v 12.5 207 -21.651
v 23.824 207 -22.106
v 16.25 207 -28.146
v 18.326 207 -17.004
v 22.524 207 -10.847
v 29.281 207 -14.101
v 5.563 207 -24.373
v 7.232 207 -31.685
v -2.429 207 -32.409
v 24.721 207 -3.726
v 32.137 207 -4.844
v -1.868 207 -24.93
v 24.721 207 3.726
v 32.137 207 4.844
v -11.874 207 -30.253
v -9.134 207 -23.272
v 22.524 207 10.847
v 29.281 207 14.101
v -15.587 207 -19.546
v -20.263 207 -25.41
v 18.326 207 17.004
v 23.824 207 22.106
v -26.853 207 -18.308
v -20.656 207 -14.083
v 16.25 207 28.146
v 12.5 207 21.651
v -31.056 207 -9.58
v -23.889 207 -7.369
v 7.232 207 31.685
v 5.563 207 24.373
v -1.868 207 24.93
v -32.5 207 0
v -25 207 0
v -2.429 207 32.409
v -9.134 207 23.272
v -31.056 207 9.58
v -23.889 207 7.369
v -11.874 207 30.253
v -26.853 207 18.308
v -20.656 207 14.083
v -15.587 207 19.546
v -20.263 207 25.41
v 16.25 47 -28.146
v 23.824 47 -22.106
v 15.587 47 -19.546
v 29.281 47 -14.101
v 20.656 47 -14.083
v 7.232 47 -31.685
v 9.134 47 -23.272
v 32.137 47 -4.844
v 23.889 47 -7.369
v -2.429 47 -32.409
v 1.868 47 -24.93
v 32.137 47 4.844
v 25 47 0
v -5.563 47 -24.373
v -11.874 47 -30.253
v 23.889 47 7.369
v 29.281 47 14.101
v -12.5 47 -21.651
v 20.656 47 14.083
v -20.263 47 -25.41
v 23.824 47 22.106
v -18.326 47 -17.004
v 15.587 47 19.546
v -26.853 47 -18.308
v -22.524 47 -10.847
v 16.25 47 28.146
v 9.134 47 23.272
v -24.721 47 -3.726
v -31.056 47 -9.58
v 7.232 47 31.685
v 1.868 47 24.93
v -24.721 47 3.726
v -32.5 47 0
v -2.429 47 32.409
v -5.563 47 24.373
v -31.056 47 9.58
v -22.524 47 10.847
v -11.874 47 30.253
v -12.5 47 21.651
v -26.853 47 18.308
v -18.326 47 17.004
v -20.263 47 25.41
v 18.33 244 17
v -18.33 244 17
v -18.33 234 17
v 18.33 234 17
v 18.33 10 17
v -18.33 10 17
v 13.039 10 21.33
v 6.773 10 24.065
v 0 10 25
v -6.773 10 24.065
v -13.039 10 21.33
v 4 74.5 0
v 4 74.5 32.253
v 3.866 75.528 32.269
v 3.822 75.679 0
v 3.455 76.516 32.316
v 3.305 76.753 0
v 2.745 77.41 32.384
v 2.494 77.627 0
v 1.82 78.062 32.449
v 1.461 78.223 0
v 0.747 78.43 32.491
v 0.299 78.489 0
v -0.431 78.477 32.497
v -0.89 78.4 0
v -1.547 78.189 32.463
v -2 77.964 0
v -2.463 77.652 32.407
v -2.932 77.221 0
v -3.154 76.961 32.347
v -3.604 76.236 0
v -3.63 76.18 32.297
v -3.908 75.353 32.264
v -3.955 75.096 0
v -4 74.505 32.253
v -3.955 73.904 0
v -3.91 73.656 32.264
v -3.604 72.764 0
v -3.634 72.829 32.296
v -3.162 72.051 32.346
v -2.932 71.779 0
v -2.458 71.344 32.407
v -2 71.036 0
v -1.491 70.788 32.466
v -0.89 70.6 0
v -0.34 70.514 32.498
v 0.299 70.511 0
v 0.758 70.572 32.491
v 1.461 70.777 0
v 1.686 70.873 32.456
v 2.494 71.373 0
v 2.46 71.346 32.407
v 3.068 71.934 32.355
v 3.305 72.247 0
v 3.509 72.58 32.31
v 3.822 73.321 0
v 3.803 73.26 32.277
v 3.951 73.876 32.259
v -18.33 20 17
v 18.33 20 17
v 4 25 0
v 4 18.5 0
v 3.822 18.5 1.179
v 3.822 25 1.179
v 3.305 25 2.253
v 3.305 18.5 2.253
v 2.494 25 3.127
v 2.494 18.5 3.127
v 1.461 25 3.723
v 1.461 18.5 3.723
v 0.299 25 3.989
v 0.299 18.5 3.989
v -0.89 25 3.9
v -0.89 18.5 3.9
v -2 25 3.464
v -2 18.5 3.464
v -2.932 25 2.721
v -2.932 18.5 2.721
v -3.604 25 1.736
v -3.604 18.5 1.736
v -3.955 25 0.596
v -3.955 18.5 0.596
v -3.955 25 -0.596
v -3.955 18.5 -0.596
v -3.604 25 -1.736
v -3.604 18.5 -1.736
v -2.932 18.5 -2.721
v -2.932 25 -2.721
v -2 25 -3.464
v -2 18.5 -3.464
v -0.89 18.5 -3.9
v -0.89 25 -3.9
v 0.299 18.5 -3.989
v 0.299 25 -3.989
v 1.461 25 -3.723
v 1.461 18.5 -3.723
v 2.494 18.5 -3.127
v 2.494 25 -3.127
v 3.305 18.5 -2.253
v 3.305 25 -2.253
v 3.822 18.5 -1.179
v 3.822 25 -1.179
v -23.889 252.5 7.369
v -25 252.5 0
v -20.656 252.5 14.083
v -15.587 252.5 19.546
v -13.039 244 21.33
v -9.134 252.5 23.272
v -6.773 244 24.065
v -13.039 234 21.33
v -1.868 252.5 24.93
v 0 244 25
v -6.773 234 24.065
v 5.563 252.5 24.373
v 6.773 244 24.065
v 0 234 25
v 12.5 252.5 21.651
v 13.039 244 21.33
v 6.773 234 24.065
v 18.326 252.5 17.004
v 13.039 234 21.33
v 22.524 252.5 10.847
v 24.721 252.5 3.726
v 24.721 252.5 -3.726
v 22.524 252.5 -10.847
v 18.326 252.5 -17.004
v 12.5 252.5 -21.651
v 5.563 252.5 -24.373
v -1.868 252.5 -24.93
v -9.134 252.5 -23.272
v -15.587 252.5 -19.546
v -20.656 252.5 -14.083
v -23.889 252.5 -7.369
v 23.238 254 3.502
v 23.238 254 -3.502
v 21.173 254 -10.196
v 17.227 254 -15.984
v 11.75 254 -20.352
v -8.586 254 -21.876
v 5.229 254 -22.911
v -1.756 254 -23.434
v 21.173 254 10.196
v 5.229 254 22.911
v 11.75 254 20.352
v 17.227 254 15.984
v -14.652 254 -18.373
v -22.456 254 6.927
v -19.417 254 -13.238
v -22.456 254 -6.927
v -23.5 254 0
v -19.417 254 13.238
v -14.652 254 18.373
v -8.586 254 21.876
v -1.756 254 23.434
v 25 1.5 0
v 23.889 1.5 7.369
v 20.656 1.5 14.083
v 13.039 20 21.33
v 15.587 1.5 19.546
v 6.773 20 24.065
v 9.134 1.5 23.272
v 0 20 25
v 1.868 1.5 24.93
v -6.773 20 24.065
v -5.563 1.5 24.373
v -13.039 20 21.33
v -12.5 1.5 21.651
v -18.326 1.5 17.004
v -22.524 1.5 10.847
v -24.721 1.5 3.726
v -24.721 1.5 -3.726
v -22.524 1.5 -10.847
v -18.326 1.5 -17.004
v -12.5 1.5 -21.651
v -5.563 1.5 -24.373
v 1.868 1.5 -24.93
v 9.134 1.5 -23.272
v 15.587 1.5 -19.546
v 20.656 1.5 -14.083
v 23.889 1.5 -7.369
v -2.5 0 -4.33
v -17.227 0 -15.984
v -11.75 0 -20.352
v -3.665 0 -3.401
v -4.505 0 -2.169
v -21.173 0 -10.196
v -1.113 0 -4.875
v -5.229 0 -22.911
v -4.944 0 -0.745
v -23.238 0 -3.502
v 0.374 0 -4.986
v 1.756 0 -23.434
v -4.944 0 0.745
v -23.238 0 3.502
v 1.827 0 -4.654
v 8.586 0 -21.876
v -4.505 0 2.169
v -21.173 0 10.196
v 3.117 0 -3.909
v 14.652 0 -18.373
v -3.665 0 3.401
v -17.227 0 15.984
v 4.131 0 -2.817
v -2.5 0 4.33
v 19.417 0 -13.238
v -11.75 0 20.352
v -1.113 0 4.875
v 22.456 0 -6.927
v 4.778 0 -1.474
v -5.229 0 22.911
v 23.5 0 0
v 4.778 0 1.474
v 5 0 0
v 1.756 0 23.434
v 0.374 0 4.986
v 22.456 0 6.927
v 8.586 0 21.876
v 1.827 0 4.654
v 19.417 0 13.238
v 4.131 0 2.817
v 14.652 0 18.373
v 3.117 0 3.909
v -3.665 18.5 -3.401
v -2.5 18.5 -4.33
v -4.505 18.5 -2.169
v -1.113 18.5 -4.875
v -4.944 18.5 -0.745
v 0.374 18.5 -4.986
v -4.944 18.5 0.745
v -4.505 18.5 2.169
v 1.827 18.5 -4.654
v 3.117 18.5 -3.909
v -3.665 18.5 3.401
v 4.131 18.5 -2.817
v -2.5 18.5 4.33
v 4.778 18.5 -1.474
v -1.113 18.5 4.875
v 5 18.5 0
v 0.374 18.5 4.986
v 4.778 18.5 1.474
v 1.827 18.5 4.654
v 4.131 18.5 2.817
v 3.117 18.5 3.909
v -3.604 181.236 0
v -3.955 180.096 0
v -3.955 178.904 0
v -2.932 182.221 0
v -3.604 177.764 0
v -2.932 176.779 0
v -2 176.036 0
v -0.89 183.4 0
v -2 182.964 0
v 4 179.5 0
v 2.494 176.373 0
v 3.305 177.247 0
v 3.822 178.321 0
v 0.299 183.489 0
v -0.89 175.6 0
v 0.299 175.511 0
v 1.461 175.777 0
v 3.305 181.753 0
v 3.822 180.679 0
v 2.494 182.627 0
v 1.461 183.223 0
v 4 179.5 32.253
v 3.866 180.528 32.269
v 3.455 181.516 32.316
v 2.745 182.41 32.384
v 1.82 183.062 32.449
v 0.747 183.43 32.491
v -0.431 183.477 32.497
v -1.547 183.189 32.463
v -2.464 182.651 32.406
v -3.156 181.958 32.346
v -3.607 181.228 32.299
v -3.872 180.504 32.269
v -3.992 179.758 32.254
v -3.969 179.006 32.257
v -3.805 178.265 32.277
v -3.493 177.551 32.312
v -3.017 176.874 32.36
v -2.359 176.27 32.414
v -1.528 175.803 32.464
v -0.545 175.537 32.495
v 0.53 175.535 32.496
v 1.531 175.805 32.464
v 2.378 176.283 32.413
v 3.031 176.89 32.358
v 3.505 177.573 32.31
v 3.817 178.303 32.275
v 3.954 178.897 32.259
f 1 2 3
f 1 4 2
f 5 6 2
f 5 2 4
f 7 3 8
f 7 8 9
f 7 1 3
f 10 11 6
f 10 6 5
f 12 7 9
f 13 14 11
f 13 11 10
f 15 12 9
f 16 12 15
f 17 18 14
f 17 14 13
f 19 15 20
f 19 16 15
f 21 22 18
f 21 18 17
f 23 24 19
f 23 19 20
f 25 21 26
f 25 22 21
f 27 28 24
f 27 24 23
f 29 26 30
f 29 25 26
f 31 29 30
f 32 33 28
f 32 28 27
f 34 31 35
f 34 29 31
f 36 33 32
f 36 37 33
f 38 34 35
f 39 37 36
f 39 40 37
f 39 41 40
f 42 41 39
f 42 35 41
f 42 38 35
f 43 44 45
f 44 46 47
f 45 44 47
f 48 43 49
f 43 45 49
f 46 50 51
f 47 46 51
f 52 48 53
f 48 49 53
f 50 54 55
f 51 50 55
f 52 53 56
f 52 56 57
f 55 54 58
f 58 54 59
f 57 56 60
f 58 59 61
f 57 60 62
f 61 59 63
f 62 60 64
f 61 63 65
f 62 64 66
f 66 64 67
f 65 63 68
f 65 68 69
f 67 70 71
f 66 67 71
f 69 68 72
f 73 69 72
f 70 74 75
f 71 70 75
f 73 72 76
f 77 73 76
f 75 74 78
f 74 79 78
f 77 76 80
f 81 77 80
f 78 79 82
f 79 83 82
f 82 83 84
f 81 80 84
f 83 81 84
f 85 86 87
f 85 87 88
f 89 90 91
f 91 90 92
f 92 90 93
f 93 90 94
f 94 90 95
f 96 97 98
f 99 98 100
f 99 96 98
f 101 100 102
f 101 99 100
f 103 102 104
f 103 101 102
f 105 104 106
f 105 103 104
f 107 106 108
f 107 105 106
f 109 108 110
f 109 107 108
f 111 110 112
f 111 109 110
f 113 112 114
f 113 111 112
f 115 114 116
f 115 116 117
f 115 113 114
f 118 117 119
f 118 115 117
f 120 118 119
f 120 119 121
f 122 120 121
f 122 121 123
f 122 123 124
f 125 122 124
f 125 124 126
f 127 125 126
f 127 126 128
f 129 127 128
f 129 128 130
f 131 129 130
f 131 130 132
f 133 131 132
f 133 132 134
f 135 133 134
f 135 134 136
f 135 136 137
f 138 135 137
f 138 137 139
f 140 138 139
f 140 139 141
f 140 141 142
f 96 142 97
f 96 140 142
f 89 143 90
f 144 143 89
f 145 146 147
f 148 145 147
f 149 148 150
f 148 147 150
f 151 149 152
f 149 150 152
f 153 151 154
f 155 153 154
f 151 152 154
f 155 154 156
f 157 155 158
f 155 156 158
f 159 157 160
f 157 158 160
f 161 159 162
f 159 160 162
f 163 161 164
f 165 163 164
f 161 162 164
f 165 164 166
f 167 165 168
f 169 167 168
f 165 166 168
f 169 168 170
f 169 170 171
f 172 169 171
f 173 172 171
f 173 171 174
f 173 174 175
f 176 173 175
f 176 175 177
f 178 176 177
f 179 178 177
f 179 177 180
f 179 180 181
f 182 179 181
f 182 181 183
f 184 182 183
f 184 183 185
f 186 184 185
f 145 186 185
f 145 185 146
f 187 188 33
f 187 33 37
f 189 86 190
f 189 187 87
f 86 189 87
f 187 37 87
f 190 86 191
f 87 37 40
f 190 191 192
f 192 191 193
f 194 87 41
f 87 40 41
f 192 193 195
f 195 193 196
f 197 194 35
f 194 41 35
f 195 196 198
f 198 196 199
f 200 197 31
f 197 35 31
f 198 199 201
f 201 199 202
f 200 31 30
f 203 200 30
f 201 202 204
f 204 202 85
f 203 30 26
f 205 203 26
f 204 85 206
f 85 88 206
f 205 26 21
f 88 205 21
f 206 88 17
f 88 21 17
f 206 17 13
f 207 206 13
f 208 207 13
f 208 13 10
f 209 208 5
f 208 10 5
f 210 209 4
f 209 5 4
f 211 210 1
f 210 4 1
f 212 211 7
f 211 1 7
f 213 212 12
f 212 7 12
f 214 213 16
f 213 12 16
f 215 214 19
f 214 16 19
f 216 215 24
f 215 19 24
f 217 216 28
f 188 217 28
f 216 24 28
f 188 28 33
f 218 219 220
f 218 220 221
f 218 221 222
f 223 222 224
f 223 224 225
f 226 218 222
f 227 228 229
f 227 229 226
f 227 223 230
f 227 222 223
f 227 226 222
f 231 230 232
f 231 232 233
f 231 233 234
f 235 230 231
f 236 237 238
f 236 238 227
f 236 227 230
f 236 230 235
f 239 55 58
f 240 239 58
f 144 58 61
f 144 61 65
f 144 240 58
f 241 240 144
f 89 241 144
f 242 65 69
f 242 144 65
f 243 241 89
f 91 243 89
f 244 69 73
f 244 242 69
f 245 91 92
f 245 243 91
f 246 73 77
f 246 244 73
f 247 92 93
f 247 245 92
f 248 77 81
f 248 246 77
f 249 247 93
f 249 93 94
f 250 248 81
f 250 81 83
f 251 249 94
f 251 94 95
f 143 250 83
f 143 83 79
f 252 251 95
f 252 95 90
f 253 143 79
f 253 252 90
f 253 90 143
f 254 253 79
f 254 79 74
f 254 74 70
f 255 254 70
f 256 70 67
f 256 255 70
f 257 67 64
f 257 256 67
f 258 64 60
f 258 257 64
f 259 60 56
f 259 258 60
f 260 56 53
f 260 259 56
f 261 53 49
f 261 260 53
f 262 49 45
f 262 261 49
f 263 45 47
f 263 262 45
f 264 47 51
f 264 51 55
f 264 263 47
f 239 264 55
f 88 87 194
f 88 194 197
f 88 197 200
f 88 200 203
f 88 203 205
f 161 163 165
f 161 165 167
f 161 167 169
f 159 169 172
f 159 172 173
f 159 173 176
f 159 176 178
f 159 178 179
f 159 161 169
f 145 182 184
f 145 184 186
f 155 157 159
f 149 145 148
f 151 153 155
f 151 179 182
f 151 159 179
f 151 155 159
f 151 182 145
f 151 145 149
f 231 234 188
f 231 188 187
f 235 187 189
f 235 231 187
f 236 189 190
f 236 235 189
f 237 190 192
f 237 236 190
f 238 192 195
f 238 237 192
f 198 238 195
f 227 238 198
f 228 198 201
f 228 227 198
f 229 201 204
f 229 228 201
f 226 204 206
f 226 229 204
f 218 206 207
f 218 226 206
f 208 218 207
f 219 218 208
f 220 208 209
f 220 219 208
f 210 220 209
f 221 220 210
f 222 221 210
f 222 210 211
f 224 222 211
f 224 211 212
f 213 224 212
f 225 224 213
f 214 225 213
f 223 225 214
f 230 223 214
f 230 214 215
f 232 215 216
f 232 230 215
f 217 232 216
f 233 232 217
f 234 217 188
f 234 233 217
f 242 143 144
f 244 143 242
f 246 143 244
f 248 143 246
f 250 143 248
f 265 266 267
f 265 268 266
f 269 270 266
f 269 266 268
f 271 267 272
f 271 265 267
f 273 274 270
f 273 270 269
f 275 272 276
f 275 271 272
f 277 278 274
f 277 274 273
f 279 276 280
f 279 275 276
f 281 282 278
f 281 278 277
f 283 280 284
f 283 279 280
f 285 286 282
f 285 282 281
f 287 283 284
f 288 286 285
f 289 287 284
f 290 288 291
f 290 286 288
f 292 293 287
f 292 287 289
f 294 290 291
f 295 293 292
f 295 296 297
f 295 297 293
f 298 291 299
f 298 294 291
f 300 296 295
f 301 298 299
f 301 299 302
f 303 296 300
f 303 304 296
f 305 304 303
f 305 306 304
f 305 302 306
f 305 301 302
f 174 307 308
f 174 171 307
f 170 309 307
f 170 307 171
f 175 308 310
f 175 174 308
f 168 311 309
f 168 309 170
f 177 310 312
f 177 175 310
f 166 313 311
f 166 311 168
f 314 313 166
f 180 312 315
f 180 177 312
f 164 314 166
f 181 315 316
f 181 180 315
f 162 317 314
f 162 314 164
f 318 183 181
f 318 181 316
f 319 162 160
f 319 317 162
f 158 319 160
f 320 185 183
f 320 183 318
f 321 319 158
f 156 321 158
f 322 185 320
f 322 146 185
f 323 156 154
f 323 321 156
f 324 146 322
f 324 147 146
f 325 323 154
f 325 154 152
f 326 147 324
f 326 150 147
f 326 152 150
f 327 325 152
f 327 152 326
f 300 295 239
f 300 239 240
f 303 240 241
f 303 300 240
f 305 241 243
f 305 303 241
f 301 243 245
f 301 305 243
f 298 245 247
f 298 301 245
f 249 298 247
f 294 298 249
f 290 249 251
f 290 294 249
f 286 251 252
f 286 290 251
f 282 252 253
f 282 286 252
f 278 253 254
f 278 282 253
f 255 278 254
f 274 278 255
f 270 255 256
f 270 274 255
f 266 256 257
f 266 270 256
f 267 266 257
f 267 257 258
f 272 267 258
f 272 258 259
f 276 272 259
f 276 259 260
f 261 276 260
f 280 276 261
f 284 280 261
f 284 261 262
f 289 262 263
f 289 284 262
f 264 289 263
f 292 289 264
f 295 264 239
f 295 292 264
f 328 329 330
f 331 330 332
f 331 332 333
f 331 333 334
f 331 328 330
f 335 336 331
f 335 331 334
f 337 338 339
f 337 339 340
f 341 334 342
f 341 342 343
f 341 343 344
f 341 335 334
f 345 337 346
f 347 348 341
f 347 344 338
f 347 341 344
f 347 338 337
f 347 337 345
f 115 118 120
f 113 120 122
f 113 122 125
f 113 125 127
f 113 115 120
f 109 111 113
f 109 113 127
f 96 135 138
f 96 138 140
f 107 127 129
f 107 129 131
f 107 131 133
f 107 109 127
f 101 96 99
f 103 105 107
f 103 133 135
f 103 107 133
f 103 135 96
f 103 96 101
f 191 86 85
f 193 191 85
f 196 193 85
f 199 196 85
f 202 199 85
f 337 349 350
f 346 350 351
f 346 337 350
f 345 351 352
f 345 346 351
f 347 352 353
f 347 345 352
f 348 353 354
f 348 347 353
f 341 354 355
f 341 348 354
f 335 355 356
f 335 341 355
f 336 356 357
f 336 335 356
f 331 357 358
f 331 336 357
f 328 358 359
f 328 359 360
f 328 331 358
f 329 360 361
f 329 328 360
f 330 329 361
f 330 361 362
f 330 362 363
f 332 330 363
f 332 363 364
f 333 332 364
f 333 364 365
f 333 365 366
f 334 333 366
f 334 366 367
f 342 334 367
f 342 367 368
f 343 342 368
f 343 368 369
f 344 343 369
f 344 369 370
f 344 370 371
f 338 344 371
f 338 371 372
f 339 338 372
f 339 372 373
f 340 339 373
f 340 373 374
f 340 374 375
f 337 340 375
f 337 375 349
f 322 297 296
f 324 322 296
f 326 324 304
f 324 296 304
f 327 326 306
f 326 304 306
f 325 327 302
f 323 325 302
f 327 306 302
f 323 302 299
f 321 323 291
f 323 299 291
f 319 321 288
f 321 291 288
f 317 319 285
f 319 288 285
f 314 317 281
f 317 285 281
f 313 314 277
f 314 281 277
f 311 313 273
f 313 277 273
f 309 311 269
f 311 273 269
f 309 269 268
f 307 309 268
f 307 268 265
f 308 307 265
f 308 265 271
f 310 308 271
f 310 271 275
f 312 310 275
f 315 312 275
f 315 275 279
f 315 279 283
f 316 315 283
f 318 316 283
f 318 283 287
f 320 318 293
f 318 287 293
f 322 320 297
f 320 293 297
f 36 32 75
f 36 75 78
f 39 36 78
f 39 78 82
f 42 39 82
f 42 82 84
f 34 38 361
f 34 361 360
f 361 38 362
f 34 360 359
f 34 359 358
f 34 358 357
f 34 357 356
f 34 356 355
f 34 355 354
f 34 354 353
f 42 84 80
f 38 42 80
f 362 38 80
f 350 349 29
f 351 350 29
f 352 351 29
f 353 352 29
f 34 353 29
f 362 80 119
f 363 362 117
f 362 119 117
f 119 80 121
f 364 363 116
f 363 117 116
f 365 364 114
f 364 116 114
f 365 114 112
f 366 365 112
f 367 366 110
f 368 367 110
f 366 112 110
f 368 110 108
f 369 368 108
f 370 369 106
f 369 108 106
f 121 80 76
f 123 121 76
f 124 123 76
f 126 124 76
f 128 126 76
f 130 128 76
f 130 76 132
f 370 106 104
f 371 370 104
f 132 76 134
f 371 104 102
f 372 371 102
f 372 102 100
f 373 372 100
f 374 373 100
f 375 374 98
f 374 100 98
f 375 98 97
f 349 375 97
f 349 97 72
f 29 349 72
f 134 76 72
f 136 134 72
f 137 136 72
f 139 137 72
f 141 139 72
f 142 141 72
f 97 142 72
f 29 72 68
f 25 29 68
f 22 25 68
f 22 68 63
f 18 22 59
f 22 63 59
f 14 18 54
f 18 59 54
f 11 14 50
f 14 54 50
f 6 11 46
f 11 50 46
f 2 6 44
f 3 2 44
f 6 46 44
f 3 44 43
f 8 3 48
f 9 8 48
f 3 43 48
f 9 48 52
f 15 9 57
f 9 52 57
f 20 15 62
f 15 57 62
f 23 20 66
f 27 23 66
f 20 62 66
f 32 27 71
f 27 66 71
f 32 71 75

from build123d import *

# Parameters (mm, degrees)
F0_R      = 25
F1_DEPTH  = 47
F2_R      = 32.5
F3_DEPTH  = 160
F4_R      = 25
F5_DEPTH  = 47
F7_W      = 60.588232
F7_H      = 10
F8_DEPTH  = 25
F9_W      = 55.500018
F9_H      = 10
F10_DEPTH = 25
F11_R     = 4
F12_DEPTH = 25
F13_R     = 4
F14_DEPTH = 92
F15_R     = 5
F16_DEPTH = 18.5
F17_SIZE  = 1.5


with BuildPart() as f1:
    # F0 (on Front) → F1 (new body)
    with BuildSketch(Plane.XZ):
        Circle(F0_R)
    extrude(amount=-F1_DEPTH)

    # F2 (on face) → F3 (join)
    with BuildSketch(Plane(origin=(0, 47, 0), x_dir=(-1, 0, 0), z_dir=(0, 1, 0))):
        Circle(F2_R)
    extrude(amount=F3_DEPTH)

    # F4 (on face) → F5 (join)
    with BuildSketch(Plane(origin=(0, 207, 0), x_dir=(-1, 0, 0), z_dir=(0, 1, 0))):
        Circle(F4_R)
    extrude(amount=F5_DEPTH)

    # F7 (on offset) → F8 (cut)
    with BuildSketch(Plane.XY.offset(17)):
        with Locations((8.858869, 15)):
            Rectangle(F7_W, F7_H)
    extrude(amount=F8_DEPTH, mode=Mode.SUBTRACT)

    # F9 (on offset) → F10 (cut)
    with BuildSketch(Plane.XY.offset(17)):
        with Locations((1.929622, 239)):
            Rectangle(F9_W, F9_H)
    extrude(amount=F10_DEPTH, mode=Mode.SUBTRACT)

    # F11 (on Front) → F12 (cut)
    with BuildSketch(Plane.XZ):
        Circle(F11_R)
    extrude(amount=-F12_DEPTH, mode=Mode.SUBTRACT)

    # F13 (on Top) → F14 (cut)
    with BuildSketch(Plane.XY):
        with Locations((0, 74.5)):
            Circle(F13_R)
        with Locations((0, 179.5)):
            Circle(F13_R)
    extrude(amount=F14_DEPTH, mode=Mode.SUBTRACT)

    # F15 (on Front) → F16 (cut)
    with BuildSketch(Plane.XZ):
        Circle(F15_R)
    extrude(amount=-F16_DEPTH, mode=Mode.SUBTRACT)

    # F17
    f17_edges = [f1.edges().sort_by_distance(p)[0] for p in [
        (-25, 0, 0),
        (25, 254, 0),
    ]]
    chamfer(f17_edges, length=F17_SIZE)


solid = f1.part
